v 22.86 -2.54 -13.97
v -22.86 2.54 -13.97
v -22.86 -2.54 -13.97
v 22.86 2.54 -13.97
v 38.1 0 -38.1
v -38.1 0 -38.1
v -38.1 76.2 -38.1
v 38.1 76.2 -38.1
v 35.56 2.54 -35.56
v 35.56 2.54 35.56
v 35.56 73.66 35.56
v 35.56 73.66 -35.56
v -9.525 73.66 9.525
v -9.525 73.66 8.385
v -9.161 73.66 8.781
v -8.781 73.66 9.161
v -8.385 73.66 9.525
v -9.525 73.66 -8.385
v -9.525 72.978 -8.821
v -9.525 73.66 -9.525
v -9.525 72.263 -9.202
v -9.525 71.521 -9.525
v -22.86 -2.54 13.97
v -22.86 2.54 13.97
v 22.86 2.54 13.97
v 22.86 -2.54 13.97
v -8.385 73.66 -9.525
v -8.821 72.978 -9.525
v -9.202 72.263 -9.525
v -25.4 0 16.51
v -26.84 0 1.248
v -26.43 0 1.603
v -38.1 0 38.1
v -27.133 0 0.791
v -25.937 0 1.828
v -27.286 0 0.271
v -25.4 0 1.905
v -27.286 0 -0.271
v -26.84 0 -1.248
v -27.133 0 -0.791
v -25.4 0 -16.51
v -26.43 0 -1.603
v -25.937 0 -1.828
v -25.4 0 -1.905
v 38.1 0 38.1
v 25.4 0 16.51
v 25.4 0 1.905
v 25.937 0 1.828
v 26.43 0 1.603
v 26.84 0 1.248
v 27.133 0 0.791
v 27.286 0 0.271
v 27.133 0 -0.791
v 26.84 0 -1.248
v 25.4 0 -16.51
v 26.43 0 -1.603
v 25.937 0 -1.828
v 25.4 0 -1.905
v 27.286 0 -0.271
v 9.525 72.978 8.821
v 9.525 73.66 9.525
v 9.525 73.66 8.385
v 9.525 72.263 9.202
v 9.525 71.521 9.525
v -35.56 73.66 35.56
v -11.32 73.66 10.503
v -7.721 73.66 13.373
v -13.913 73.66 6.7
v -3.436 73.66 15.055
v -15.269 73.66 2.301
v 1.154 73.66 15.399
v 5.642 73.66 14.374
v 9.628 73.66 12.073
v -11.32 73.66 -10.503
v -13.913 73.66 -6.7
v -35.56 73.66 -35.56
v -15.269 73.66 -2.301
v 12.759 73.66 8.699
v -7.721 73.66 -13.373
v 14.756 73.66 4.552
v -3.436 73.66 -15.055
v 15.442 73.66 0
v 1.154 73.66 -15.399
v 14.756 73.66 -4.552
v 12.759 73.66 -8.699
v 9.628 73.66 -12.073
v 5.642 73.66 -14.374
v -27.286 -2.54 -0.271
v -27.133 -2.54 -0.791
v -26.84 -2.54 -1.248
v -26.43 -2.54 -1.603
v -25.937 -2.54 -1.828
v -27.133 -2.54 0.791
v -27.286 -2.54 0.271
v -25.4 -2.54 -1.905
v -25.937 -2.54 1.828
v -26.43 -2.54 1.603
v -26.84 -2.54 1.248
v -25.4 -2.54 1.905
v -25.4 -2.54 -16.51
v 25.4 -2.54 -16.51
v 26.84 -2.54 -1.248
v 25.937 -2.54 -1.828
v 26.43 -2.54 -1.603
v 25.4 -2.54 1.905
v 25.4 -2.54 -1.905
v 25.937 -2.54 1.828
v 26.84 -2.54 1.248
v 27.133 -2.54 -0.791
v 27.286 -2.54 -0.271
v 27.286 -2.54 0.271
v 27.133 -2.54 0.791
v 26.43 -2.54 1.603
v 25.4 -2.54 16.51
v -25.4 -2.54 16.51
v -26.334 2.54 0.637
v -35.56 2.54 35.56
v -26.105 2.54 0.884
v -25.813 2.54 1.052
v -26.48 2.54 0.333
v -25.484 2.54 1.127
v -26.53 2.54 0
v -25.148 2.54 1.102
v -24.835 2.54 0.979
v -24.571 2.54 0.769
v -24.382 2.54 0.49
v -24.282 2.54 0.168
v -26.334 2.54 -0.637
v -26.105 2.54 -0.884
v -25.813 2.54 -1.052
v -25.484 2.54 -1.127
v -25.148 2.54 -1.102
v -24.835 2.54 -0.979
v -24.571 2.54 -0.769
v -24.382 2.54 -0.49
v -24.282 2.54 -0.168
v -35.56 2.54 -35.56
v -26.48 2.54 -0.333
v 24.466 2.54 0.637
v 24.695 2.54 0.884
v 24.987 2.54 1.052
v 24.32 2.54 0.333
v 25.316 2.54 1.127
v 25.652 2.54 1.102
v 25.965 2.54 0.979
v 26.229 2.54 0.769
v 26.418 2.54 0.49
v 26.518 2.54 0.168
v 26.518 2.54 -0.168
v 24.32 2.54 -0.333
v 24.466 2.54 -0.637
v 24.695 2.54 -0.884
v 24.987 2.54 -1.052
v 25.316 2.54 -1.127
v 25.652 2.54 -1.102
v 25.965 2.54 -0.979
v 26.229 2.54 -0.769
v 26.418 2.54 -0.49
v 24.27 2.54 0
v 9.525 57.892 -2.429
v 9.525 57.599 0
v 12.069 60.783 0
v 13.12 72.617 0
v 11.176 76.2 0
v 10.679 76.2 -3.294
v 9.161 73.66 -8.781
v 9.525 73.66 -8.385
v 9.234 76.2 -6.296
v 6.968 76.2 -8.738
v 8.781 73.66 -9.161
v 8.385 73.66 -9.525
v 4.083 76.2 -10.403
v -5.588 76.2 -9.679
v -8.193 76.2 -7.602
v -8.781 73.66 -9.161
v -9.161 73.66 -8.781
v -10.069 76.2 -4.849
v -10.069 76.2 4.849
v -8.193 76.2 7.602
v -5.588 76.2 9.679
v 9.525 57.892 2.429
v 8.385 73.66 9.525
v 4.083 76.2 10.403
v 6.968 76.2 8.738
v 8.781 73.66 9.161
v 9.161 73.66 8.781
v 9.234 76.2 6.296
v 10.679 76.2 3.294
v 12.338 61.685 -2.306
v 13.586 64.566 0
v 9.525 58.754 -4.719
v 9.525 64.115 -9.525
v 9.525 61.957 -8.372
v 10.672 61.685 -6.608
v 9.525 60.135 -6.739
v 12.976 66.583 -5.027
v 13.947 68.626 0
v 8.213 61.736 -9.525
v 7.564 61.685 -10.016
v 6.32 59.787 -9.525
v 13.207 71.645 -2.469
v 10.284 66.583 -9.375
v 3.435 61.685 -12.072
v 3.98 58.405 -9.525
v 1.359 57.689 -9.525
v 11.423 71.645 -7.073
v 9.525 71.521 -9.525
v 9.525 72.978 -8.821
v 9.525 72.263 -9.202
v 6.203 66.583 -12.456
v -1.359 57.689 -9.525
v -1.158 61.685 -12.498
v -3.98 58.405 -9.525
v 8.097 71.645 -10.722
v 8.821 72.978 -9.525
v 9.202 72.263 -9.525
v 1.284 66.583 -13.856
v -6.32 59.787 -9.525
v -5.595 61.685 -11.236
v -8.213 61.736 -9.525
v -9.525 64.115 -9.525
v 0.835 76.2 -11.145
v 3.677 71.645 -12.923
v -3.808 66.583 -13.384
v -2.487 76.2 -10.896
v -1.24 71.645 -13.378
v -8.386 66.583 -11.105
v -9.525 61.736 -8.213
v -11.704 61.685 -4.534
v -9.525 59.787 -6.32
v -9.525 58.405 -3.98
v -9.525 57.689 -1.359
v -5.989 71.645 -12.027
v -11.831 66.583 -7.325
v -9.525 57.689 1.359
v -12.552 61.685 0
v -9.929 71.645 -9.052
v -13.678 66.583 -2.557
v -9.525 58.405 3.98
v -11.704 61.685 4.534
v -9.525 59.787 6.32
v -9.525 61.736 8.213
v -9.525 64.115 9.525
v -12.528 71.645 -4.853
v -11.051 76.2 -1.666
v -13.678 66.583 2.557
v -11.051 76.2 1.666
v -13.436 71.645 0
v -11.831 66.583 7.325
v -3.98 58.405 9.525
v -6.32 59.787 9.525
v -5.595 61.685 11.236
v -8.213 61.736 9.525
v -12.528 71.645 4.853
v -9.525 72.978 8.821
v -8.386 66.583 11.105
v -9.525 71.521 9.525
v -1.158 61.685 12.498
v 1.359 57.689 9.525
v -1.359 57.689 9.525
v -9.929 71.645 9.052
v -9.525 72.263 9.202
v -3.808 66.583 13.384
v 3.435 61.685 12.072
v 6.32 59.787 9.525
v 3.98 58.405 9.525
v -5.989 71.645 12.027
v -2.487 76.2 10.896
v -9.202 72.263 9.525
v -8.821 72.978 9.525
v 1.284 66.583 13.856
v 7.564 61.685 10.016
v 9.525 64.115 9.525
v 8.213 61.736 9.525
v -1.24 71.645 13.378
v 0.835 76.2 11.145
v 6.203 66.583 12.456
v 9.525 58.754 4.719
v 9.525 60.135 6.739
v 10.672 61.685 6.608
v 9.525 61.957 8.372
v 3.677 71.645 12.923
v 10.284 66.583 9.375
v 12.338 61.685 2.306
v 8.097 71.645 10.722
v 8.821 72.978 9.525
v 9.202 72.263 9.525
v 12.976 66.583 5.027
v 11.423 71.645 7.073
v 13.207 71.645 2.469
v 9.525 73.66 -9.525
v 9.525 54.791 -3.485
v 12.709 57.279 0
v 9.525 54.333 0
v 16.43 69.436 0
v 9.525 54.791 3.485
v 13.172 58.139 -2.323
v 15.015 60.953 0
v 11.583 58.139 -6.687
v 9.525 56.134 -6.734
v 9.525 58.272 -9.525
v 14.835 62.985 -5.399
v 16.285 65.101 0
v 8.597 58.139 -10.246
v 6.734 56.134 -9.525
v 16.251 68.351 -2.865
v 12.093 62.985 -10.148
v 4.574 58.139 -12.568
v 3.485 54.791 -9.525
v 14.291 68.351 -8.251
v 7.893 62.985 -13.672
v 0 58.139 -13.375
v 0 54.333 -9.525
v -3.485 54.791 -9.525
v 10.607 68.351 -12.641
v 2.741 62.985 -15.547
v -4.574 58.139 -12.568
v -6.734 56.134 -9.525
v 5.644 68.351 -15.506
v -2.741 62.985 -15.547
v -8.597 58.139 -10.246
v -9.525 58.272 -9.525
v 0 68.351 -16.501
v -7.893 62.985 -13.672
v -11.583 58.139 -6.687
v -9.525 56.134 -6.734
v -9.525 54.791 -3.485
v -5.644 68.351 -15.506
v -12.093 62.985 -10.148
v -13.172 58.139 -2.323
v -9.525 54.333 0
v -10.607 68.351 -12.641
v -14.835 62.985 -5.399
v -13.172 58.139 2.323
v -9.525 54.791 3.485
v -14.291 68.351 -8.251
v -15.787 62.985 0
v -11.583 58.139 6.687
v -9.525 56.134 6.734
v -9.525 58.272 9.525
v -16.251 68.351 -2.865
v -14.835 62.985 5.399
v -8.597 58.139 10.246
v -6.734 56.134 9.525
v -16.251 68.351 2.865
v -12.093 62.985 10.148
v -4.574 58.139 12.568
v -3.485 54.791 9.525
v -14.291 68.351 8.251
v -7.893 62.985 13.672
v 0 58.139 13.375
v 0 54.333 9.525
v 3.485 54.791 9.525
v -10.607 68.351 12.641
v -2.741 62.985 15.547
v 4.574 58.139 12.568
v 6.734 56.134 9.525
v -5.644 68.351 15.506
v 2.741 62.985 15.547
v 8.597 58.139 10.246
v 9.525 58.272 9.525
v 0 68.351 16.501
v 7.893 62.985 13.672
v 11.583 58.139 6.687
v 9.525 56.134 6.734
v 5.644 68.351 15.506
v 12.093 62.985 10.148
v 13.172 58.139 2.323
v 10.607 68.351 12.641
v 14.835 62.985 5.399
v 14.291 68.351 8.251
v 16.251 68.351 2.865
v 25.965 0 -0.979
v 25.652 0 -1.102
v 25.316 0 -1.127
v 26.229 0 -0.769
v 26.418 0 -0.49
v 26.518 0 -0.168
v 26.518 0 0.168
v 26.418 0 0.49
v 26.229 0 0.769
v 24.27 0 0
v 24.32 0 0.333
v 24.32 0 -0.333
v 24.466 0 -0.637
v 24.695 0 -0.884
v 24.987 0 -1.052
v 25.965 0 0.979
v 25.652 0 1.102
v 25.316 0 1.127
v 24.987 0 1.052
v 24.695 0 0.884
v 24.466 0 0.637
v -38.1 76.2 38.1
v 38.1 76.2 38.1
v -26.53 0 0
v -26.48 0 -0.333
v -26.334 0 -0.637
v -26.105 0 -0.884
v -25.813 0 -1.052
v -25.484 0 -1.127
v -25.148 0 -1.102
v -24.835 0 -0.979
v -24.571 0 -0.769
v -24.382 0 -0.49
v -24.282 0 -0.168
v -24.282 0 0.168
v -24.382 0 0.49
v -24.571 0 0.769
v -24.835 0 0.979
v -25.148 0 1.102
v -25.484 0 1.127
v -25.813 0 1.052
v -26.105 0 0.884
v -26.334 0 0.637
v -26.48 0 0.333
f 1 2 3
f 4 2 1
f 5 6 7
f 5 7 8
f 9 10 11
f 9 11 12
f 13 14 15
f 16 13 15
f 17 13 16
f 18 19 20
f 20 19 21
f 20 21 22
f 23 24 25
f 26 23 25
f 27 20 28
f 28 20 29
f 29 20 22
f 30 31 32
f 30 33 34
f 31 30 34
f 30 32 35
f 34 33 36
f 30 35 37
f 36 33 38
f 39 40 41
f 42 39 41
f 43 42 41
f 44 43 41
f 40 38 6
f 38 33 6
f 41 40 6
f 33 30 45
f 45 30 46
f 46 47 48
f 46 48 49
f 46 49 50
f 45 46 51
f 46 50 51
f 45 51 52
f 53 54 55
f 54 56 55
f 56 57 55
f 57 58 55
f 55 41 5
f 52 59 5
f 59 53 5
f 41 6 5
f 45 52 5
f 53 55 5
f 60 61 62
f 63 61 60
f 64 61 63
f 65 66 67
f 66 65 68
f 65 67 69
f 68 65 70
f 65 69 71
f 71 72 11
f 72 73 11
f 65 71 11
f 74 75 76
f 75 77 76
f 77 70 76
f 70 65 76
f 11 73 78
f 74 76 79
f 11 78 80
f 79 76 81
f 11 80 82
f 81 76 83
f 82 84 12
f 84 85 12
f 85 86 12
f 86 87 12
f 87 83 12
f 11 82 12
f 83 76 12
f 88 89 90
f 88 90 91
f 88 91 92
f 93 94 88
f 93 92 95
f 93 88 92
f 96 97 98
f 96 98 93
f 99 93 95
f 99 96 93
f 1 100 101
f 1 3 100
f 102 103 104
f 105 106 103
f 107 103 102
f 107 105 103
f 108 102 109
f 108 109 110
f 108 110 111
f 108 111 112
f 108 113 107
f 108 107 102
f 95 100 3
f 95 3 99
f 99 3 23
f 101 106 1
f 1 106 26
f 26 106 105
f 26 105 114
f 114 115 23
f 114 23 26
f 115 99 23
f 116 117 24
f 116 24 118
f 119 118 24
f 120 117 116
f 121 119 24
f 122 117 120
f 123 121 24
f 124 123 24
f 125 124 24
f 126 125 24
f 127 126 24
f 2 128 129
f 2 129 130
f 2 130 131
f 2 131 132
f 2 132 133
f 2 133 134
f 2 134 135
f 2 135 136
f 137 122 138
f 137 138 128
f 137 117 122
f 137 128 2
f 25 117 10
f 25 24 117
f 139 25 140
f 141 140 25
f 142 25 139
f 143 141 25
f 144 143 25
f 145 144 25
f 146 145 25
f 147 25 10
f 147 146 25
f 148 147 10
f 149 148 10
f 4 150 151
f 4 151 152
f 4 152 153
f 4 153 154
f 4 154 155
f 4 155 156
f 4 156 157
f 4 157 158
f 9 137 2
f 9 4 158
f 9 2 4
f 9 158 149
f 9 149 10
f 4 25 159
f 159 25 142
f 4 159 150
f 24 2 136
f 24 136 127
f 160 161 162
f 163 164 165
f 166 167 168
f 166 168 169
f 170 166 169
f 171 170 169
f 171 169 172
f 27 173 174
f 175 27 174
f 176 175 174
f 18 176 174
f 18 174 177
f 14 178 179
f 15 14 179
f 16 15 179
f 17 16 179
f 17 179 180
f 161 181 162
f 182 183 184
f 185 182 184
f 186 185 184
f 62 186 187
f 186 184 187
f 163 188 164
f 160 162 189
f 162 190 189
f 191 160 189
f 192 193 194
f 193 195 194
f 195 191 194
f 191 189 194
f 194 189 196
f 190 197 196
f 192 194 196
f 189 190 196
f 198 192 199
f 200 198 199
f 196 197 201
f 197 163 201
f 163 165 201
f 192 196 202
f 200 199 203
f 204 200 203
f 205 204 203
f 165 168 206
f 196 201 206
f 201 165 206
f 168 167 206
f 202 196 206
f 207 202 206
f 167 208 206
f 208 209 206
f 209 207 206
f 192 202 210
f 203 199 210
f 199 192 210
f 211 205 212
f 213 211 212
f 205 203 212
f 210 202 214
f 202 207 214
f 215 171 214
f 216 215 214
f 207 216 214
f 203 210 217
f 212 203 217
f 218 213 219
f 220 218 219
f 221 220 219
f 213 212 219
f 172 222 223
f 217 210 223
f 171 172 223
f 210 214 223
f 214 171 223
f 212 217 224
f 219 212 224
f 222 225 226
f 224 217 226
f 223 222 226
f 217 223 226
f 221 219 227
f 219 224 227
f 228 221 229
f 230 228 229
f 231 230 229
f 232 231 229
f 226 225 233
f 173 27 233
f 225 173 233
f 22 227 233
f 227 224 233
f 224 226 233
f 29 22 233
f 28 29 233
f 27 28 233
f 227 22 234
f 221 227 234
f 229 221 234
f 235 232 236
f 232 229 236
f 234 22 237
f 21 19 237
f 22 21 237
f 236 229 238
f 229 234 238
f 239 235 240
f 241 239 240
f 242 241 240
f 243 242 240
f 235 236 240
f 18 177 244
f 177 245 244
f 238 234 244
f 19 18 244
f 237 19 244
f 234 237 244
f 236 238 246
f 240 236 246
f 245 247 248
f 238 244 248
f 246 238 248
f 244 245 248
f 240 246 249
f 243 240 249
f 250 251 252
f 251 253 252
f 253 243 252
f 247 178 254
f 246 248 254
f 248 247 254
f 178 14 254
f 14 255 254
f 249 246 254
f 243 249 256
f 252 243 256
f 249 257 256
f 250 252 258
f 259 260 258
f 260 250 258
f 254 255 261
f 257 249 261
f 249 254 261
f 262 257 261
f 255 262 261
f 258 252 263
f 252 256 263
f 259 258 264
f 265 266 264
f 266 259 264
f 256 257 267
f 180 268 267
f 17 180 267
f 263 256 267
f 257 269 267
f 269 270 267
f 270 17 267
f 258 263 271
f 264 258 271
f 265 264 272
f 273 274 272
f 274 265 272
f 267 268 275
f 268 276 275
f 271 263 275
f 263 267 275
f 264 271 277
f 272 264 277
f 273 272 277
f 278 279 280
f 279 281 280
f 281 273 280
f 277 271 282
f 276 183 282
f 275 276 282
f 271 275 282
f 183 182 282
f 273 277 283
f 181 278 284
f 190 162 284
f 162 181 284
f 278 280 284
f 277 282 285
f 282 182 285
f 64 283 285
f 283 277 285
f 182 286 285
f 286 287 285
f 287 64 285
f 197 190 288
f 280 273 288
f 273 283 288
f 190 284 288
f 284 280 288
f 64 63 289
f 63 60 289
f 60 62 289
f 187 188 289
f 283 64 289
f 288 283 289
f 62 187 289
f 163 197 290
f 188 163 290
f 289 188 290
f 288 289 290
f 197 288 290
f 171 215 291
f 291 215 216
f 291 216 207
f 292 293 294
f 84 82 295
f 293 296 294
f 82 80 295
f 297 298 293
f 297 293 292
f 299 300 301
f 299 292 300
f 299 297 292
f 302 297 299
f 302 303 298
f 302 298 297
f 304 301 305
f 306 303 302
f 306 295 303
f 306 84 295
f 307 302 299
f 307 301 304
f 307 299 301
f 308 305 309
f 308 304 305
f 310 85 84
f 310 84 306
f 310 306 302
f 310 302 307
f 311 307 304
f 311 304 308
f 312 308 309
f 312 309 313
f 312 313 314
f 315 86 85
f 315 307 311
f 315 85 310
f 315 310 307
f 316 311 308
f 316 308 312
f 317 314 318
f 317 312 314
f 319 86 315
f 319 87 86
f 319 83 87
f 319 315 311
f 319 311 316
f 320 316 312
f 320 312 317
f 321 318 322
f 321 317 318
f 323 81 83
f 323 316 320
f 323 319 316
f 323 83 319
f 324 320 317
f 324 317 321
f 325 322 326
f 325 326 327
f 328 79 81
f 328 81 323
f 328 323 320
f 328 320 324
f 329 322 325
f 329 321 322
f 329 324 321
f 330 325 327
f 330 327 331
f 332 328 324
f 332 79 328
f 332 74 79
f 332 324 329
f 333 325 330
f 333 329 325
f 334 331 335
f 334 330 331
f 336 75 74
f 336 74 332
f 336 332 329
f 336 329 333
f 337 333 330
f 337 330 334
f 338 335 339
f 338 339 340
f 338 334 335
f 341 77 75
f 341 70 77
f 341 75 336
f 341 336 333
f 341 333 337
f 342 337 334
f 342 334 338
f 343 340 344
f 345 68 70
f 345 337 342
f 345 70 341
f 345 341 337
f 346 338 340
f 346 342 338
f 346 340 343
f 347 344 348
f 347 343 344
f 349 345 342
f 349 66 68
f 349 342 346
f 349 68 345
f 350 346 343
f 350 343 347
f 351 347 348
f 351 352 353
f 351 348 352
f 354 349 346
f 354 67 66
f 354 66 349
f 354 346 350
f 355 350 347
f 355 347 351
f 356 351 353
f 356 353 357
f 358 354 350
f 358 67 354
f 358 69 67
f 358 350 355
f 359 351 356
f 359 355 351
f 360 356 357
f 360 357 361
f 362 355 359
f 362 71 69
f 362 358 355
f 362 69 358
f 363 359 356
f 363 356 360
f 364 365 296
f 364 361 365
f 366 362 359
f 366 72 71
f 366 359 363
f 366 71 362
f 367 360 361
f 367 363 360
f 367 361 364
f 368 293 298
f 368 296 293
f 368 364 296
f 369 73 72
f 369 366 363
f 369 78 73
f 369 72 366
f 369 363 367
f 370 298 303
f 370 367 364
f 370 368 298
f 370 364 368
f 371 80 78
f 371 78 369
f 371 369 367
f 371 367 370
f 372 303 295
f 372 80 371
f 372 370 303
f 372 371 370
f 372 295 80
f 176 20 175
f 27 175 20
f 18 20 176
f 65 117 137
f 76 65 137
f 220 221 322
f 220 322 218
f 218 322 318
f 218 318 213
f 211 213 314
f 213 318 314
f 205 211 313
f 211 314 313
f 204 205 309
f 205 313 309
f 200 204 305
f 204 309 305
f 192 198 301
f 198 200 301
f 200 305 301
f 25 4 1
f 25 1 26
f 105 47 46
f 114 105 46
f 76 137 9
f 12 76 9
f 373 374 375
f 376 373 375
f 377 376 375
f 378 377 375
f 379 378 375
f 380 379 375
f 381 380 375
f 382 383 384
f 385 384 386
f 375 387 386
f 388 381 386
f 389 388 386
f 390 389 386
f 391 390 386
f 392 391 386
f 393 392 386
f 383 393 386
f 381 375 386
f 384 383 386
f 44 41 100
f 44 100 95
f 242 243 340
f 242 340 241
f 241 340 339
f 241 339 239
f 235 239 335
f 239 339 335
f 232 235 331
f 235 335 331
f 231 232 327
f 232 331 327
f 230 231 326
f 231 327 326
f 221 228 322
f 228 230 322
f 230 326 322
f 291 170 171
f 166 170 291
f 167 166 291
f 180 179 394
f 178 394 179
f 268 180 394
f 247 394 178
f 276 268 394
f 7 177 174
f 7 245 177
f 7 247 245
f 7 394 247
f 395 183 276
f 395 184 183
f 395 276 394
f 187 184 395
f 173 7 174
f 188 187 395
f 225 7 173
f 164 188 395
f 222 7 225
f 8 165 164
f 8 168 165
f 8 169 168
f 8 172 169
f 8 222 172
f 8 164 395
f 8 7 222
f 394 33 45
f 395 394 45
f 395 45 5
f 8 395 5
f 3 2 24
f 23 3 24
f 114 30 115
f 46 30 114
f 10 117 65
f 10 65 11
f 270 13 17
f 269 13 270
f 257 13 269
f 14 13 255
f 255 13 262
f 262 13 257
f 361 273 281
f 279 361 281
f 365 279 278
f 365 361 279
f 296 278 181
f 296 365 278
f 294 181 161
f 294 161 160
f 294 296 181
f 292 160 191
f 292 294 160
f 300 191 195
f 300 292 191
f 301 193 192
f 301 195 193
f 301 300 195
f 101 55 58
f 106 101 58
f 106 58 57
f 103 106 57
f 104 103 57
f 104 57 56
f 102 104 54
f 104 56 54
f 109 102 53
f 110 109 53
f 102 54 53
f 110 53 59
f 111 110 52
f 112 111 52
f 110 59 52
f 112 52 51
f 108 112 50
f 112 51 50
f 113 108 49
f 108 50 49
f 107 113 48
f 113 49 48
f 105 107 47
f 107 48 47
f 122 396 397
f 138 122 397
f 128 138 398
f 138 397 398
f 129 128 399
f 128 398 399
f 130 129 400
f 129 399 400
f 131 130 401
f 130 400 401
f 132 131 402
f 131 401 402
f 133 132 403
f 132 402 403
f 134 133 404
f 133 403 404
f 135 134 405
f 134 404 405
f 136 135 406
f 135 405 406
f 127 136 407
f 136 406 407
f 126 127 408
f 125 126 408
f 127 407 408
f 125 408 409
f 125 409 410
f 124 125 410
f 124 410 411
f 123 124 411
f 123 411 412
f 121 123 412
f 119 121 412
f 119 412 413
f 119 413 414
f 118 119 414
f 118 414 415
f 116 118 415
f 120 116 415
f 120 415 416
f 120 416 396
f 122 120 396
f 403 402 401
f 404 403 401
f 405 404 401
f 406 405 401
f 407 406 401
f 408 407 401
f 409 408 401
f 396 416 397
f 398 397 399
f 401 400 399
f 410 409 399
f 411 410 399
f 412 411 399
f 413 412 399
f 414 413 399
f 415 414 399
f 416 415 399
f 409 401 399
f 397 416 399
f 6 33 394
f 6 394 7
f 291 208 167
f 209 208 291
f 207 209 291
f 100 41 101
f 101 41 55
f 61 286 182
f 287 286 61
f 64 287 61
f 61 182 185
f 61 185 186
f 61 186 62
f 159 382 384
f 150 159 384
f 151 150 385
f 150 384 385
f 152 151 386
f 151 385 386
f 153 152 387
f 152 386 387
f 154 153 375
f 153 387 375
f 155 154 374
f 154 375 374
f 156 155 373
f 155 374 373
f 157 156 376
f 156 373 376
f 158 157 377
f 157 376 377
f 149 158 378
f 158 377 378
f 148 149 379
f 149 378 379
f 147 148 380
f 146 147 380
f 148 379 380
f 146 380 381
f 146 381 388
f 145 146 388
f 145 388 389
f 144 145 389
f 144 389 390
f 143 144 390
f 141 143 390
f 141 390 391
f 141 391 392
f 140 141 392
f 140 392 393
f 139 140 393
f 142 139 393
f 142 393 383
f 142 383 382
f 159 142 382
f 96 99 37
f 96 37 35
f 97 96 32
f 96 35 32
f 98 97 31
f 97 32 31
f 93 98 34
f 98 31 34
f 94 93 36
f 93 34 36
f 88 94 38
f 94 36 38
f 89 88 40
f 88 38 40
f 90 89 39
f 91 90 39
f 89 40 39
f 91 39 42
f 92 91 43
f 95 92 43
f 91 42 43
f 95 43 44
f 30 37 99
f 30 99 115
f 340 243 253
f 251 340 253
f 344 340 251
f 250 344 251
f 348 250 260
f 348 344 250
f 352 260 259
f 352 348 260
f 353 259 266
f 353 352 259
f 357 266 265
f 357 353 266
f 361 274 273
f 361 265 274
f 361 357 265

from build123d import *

# Parameters (mm, degrees)
SKETCH1_W                  = 76.2
SKETCH1_H                  = 76.2
MAIN_BODY_DEPTH            = 76.2
SKETCH6_W                  = 50.8
SKETCH6_H                  = 33.02
CAMERA_BASE_DEPTH          = 2.54
SHELL_T                    = -2.54
SKETCH13_R                 = 1.905
SCREW_MOUNTS_DEPTH         = 2.54
F_4_40_TAPPED_HOLE1_REACH  = 95.326
F_4_40_TAPPED_HOLE1_BORE_R = 1.1303
CHECK_OUT_THE_BOTTOM_REACH = 95.326
SKETCH16_W                 = 19.05
SKETCH16_H                 = 19.05


with BuildPart() as part:
    # Sketch1 → main body (new body)
    with BuildSketch(Plane(origin=(0, 0, 0), x_dir=(1, 0, 0), z_dir=(0, 1, 0))):
        Rectangle(SKETCH1_W, SKETCH1_H)
    extrude(amount=MAIN_BODY_DEPTH)

    # Sketch5 → trackball hole (revolve, cut)
    with BuildSketch(Plane.XY):
        with BuildLine():
            Line((0, 81.788), (0, 53.848))
            ThreePointArc((0, 53.848), (13.97, 67.818), (0, 81.788))
        make_face()
    revolve(axis=Axis((0, -906.782, 0), (0, 1, 0)), mode=Mode.SUBTRACT)

    # Sketch6 → camera base (add)
    with BuildSketch(Plane.XZ):
        Rectangle(SKETCH6_W, SKETCH6_H)
    extrude(amount=CAMERA_BASE_DEPTH)

    # shell
    shell_openings = [part.faces().sort_by_distance(p)[0] for p in [
        (0, -2.54, 0),
    ]]
    offset(amount=SHELL_T, openings=shell_openings, kind=Kind.INTERSECTION)

    # Sketch13 → screw mounts (add)
    with BuildSketch(Plane.XZ):
        with Locations((-25.4, 0)):
            Circle(SKETCH13_R)
        with Locations((25.4, 0)):
            Circle(SKETCH13_R)
    extrude(amount=SCREW_MOUNTS_DEPTH)

    # #4-40 Tapped Hole1 bore → #4-40 Tapped Hole1 (cut, up to next)
    with BuildSketch(Plane(origin=(0, 0, 0), x_dir=(-1, 0, 0), z_dir=(0, -1, 0)), mode=Mode.PRIVATE) as f_4_40_tapped_hole1_sk1:
        with Locations((25.4, 0)):
            Circle(F_4_40_TAPPED_HOLE1_BORE_R)
    f_4_40_tapped_hole1_tool1 = extrude(f_4_40_tapped_hole1_sk1.sketch, amount=-F_4_40_TAPPED_HOLE1_REACH, mode=Mode.PRIVATE) & part.part
    # #4-40 Tapped Hole1 bore → #4-40 Tapped Hole1 (cut, up to next)
    with BuildSketch(Plane(origin=(0, 0, 0), x_dir=(-1, 0, 0), z_dir=(0, -1, 0)), mode=Mode.PRIVATE) as f_4_40_tapped_hole1_sk2:
        with Locations((-25.4, 0)):
            Circle(F_4_40_TAPPED_HOLE1_BORE_R)
    f_4_40_tapped_hole1_tool2 = extrude(f_4_40_tapped_hole1_sk2.sketch, amount=-F_4_40_TAPPED_HOLE1_REACH, mode=Mode.PRIVATE) & part.part
    add(f_4_40_tapped_hole1_tool1.solids().sort_by_distance((-25.4, 0, 0))[0], mode=Mode.SUBTRACT)
    add(f_4_40_tapped_hole1_tool2.solids().sort_by_distance((25.4, 0, 0))[0], mode=Mode.SUBTRACT)

    # check out the bottom: up to this face of the body (flat: up to its plane)
    check_out_the_bottom_end = Plane(part.part.faces().sort_by_distance((0, 73.66, -34.554211314))[0])
    # Sketch16 → check out the bottom (cut, up to the picked face)
    with BuildSketch(Plane(origin=(0, 0, 0), x_dir=(1, 0, 0), z_dir=(0, 1, 0)), mode=Mode.PRIVATE) as check_out_the_bottom_sk1:
        Rectangle(SKETCH16_W, SKETCH16_H)
    check_out_the_bottom_tool1 = split(extrude(check_out_the_bottom_sk1.sketch, amount=CHECK_OUT_THE_BOTTOM_REACH, mode=Mode.PRIVATE), bisect_by=check_out_the_bottom_end, keep=Keep.BOTH, mode=Mode.PRIVATE)
    add(check_out_the_bottom_tool1.solids().sort_by(Axis((0, 0, 0), (0, 1, 0)))[0], mode=Mode.SUBTRACT)


solid = part.part
